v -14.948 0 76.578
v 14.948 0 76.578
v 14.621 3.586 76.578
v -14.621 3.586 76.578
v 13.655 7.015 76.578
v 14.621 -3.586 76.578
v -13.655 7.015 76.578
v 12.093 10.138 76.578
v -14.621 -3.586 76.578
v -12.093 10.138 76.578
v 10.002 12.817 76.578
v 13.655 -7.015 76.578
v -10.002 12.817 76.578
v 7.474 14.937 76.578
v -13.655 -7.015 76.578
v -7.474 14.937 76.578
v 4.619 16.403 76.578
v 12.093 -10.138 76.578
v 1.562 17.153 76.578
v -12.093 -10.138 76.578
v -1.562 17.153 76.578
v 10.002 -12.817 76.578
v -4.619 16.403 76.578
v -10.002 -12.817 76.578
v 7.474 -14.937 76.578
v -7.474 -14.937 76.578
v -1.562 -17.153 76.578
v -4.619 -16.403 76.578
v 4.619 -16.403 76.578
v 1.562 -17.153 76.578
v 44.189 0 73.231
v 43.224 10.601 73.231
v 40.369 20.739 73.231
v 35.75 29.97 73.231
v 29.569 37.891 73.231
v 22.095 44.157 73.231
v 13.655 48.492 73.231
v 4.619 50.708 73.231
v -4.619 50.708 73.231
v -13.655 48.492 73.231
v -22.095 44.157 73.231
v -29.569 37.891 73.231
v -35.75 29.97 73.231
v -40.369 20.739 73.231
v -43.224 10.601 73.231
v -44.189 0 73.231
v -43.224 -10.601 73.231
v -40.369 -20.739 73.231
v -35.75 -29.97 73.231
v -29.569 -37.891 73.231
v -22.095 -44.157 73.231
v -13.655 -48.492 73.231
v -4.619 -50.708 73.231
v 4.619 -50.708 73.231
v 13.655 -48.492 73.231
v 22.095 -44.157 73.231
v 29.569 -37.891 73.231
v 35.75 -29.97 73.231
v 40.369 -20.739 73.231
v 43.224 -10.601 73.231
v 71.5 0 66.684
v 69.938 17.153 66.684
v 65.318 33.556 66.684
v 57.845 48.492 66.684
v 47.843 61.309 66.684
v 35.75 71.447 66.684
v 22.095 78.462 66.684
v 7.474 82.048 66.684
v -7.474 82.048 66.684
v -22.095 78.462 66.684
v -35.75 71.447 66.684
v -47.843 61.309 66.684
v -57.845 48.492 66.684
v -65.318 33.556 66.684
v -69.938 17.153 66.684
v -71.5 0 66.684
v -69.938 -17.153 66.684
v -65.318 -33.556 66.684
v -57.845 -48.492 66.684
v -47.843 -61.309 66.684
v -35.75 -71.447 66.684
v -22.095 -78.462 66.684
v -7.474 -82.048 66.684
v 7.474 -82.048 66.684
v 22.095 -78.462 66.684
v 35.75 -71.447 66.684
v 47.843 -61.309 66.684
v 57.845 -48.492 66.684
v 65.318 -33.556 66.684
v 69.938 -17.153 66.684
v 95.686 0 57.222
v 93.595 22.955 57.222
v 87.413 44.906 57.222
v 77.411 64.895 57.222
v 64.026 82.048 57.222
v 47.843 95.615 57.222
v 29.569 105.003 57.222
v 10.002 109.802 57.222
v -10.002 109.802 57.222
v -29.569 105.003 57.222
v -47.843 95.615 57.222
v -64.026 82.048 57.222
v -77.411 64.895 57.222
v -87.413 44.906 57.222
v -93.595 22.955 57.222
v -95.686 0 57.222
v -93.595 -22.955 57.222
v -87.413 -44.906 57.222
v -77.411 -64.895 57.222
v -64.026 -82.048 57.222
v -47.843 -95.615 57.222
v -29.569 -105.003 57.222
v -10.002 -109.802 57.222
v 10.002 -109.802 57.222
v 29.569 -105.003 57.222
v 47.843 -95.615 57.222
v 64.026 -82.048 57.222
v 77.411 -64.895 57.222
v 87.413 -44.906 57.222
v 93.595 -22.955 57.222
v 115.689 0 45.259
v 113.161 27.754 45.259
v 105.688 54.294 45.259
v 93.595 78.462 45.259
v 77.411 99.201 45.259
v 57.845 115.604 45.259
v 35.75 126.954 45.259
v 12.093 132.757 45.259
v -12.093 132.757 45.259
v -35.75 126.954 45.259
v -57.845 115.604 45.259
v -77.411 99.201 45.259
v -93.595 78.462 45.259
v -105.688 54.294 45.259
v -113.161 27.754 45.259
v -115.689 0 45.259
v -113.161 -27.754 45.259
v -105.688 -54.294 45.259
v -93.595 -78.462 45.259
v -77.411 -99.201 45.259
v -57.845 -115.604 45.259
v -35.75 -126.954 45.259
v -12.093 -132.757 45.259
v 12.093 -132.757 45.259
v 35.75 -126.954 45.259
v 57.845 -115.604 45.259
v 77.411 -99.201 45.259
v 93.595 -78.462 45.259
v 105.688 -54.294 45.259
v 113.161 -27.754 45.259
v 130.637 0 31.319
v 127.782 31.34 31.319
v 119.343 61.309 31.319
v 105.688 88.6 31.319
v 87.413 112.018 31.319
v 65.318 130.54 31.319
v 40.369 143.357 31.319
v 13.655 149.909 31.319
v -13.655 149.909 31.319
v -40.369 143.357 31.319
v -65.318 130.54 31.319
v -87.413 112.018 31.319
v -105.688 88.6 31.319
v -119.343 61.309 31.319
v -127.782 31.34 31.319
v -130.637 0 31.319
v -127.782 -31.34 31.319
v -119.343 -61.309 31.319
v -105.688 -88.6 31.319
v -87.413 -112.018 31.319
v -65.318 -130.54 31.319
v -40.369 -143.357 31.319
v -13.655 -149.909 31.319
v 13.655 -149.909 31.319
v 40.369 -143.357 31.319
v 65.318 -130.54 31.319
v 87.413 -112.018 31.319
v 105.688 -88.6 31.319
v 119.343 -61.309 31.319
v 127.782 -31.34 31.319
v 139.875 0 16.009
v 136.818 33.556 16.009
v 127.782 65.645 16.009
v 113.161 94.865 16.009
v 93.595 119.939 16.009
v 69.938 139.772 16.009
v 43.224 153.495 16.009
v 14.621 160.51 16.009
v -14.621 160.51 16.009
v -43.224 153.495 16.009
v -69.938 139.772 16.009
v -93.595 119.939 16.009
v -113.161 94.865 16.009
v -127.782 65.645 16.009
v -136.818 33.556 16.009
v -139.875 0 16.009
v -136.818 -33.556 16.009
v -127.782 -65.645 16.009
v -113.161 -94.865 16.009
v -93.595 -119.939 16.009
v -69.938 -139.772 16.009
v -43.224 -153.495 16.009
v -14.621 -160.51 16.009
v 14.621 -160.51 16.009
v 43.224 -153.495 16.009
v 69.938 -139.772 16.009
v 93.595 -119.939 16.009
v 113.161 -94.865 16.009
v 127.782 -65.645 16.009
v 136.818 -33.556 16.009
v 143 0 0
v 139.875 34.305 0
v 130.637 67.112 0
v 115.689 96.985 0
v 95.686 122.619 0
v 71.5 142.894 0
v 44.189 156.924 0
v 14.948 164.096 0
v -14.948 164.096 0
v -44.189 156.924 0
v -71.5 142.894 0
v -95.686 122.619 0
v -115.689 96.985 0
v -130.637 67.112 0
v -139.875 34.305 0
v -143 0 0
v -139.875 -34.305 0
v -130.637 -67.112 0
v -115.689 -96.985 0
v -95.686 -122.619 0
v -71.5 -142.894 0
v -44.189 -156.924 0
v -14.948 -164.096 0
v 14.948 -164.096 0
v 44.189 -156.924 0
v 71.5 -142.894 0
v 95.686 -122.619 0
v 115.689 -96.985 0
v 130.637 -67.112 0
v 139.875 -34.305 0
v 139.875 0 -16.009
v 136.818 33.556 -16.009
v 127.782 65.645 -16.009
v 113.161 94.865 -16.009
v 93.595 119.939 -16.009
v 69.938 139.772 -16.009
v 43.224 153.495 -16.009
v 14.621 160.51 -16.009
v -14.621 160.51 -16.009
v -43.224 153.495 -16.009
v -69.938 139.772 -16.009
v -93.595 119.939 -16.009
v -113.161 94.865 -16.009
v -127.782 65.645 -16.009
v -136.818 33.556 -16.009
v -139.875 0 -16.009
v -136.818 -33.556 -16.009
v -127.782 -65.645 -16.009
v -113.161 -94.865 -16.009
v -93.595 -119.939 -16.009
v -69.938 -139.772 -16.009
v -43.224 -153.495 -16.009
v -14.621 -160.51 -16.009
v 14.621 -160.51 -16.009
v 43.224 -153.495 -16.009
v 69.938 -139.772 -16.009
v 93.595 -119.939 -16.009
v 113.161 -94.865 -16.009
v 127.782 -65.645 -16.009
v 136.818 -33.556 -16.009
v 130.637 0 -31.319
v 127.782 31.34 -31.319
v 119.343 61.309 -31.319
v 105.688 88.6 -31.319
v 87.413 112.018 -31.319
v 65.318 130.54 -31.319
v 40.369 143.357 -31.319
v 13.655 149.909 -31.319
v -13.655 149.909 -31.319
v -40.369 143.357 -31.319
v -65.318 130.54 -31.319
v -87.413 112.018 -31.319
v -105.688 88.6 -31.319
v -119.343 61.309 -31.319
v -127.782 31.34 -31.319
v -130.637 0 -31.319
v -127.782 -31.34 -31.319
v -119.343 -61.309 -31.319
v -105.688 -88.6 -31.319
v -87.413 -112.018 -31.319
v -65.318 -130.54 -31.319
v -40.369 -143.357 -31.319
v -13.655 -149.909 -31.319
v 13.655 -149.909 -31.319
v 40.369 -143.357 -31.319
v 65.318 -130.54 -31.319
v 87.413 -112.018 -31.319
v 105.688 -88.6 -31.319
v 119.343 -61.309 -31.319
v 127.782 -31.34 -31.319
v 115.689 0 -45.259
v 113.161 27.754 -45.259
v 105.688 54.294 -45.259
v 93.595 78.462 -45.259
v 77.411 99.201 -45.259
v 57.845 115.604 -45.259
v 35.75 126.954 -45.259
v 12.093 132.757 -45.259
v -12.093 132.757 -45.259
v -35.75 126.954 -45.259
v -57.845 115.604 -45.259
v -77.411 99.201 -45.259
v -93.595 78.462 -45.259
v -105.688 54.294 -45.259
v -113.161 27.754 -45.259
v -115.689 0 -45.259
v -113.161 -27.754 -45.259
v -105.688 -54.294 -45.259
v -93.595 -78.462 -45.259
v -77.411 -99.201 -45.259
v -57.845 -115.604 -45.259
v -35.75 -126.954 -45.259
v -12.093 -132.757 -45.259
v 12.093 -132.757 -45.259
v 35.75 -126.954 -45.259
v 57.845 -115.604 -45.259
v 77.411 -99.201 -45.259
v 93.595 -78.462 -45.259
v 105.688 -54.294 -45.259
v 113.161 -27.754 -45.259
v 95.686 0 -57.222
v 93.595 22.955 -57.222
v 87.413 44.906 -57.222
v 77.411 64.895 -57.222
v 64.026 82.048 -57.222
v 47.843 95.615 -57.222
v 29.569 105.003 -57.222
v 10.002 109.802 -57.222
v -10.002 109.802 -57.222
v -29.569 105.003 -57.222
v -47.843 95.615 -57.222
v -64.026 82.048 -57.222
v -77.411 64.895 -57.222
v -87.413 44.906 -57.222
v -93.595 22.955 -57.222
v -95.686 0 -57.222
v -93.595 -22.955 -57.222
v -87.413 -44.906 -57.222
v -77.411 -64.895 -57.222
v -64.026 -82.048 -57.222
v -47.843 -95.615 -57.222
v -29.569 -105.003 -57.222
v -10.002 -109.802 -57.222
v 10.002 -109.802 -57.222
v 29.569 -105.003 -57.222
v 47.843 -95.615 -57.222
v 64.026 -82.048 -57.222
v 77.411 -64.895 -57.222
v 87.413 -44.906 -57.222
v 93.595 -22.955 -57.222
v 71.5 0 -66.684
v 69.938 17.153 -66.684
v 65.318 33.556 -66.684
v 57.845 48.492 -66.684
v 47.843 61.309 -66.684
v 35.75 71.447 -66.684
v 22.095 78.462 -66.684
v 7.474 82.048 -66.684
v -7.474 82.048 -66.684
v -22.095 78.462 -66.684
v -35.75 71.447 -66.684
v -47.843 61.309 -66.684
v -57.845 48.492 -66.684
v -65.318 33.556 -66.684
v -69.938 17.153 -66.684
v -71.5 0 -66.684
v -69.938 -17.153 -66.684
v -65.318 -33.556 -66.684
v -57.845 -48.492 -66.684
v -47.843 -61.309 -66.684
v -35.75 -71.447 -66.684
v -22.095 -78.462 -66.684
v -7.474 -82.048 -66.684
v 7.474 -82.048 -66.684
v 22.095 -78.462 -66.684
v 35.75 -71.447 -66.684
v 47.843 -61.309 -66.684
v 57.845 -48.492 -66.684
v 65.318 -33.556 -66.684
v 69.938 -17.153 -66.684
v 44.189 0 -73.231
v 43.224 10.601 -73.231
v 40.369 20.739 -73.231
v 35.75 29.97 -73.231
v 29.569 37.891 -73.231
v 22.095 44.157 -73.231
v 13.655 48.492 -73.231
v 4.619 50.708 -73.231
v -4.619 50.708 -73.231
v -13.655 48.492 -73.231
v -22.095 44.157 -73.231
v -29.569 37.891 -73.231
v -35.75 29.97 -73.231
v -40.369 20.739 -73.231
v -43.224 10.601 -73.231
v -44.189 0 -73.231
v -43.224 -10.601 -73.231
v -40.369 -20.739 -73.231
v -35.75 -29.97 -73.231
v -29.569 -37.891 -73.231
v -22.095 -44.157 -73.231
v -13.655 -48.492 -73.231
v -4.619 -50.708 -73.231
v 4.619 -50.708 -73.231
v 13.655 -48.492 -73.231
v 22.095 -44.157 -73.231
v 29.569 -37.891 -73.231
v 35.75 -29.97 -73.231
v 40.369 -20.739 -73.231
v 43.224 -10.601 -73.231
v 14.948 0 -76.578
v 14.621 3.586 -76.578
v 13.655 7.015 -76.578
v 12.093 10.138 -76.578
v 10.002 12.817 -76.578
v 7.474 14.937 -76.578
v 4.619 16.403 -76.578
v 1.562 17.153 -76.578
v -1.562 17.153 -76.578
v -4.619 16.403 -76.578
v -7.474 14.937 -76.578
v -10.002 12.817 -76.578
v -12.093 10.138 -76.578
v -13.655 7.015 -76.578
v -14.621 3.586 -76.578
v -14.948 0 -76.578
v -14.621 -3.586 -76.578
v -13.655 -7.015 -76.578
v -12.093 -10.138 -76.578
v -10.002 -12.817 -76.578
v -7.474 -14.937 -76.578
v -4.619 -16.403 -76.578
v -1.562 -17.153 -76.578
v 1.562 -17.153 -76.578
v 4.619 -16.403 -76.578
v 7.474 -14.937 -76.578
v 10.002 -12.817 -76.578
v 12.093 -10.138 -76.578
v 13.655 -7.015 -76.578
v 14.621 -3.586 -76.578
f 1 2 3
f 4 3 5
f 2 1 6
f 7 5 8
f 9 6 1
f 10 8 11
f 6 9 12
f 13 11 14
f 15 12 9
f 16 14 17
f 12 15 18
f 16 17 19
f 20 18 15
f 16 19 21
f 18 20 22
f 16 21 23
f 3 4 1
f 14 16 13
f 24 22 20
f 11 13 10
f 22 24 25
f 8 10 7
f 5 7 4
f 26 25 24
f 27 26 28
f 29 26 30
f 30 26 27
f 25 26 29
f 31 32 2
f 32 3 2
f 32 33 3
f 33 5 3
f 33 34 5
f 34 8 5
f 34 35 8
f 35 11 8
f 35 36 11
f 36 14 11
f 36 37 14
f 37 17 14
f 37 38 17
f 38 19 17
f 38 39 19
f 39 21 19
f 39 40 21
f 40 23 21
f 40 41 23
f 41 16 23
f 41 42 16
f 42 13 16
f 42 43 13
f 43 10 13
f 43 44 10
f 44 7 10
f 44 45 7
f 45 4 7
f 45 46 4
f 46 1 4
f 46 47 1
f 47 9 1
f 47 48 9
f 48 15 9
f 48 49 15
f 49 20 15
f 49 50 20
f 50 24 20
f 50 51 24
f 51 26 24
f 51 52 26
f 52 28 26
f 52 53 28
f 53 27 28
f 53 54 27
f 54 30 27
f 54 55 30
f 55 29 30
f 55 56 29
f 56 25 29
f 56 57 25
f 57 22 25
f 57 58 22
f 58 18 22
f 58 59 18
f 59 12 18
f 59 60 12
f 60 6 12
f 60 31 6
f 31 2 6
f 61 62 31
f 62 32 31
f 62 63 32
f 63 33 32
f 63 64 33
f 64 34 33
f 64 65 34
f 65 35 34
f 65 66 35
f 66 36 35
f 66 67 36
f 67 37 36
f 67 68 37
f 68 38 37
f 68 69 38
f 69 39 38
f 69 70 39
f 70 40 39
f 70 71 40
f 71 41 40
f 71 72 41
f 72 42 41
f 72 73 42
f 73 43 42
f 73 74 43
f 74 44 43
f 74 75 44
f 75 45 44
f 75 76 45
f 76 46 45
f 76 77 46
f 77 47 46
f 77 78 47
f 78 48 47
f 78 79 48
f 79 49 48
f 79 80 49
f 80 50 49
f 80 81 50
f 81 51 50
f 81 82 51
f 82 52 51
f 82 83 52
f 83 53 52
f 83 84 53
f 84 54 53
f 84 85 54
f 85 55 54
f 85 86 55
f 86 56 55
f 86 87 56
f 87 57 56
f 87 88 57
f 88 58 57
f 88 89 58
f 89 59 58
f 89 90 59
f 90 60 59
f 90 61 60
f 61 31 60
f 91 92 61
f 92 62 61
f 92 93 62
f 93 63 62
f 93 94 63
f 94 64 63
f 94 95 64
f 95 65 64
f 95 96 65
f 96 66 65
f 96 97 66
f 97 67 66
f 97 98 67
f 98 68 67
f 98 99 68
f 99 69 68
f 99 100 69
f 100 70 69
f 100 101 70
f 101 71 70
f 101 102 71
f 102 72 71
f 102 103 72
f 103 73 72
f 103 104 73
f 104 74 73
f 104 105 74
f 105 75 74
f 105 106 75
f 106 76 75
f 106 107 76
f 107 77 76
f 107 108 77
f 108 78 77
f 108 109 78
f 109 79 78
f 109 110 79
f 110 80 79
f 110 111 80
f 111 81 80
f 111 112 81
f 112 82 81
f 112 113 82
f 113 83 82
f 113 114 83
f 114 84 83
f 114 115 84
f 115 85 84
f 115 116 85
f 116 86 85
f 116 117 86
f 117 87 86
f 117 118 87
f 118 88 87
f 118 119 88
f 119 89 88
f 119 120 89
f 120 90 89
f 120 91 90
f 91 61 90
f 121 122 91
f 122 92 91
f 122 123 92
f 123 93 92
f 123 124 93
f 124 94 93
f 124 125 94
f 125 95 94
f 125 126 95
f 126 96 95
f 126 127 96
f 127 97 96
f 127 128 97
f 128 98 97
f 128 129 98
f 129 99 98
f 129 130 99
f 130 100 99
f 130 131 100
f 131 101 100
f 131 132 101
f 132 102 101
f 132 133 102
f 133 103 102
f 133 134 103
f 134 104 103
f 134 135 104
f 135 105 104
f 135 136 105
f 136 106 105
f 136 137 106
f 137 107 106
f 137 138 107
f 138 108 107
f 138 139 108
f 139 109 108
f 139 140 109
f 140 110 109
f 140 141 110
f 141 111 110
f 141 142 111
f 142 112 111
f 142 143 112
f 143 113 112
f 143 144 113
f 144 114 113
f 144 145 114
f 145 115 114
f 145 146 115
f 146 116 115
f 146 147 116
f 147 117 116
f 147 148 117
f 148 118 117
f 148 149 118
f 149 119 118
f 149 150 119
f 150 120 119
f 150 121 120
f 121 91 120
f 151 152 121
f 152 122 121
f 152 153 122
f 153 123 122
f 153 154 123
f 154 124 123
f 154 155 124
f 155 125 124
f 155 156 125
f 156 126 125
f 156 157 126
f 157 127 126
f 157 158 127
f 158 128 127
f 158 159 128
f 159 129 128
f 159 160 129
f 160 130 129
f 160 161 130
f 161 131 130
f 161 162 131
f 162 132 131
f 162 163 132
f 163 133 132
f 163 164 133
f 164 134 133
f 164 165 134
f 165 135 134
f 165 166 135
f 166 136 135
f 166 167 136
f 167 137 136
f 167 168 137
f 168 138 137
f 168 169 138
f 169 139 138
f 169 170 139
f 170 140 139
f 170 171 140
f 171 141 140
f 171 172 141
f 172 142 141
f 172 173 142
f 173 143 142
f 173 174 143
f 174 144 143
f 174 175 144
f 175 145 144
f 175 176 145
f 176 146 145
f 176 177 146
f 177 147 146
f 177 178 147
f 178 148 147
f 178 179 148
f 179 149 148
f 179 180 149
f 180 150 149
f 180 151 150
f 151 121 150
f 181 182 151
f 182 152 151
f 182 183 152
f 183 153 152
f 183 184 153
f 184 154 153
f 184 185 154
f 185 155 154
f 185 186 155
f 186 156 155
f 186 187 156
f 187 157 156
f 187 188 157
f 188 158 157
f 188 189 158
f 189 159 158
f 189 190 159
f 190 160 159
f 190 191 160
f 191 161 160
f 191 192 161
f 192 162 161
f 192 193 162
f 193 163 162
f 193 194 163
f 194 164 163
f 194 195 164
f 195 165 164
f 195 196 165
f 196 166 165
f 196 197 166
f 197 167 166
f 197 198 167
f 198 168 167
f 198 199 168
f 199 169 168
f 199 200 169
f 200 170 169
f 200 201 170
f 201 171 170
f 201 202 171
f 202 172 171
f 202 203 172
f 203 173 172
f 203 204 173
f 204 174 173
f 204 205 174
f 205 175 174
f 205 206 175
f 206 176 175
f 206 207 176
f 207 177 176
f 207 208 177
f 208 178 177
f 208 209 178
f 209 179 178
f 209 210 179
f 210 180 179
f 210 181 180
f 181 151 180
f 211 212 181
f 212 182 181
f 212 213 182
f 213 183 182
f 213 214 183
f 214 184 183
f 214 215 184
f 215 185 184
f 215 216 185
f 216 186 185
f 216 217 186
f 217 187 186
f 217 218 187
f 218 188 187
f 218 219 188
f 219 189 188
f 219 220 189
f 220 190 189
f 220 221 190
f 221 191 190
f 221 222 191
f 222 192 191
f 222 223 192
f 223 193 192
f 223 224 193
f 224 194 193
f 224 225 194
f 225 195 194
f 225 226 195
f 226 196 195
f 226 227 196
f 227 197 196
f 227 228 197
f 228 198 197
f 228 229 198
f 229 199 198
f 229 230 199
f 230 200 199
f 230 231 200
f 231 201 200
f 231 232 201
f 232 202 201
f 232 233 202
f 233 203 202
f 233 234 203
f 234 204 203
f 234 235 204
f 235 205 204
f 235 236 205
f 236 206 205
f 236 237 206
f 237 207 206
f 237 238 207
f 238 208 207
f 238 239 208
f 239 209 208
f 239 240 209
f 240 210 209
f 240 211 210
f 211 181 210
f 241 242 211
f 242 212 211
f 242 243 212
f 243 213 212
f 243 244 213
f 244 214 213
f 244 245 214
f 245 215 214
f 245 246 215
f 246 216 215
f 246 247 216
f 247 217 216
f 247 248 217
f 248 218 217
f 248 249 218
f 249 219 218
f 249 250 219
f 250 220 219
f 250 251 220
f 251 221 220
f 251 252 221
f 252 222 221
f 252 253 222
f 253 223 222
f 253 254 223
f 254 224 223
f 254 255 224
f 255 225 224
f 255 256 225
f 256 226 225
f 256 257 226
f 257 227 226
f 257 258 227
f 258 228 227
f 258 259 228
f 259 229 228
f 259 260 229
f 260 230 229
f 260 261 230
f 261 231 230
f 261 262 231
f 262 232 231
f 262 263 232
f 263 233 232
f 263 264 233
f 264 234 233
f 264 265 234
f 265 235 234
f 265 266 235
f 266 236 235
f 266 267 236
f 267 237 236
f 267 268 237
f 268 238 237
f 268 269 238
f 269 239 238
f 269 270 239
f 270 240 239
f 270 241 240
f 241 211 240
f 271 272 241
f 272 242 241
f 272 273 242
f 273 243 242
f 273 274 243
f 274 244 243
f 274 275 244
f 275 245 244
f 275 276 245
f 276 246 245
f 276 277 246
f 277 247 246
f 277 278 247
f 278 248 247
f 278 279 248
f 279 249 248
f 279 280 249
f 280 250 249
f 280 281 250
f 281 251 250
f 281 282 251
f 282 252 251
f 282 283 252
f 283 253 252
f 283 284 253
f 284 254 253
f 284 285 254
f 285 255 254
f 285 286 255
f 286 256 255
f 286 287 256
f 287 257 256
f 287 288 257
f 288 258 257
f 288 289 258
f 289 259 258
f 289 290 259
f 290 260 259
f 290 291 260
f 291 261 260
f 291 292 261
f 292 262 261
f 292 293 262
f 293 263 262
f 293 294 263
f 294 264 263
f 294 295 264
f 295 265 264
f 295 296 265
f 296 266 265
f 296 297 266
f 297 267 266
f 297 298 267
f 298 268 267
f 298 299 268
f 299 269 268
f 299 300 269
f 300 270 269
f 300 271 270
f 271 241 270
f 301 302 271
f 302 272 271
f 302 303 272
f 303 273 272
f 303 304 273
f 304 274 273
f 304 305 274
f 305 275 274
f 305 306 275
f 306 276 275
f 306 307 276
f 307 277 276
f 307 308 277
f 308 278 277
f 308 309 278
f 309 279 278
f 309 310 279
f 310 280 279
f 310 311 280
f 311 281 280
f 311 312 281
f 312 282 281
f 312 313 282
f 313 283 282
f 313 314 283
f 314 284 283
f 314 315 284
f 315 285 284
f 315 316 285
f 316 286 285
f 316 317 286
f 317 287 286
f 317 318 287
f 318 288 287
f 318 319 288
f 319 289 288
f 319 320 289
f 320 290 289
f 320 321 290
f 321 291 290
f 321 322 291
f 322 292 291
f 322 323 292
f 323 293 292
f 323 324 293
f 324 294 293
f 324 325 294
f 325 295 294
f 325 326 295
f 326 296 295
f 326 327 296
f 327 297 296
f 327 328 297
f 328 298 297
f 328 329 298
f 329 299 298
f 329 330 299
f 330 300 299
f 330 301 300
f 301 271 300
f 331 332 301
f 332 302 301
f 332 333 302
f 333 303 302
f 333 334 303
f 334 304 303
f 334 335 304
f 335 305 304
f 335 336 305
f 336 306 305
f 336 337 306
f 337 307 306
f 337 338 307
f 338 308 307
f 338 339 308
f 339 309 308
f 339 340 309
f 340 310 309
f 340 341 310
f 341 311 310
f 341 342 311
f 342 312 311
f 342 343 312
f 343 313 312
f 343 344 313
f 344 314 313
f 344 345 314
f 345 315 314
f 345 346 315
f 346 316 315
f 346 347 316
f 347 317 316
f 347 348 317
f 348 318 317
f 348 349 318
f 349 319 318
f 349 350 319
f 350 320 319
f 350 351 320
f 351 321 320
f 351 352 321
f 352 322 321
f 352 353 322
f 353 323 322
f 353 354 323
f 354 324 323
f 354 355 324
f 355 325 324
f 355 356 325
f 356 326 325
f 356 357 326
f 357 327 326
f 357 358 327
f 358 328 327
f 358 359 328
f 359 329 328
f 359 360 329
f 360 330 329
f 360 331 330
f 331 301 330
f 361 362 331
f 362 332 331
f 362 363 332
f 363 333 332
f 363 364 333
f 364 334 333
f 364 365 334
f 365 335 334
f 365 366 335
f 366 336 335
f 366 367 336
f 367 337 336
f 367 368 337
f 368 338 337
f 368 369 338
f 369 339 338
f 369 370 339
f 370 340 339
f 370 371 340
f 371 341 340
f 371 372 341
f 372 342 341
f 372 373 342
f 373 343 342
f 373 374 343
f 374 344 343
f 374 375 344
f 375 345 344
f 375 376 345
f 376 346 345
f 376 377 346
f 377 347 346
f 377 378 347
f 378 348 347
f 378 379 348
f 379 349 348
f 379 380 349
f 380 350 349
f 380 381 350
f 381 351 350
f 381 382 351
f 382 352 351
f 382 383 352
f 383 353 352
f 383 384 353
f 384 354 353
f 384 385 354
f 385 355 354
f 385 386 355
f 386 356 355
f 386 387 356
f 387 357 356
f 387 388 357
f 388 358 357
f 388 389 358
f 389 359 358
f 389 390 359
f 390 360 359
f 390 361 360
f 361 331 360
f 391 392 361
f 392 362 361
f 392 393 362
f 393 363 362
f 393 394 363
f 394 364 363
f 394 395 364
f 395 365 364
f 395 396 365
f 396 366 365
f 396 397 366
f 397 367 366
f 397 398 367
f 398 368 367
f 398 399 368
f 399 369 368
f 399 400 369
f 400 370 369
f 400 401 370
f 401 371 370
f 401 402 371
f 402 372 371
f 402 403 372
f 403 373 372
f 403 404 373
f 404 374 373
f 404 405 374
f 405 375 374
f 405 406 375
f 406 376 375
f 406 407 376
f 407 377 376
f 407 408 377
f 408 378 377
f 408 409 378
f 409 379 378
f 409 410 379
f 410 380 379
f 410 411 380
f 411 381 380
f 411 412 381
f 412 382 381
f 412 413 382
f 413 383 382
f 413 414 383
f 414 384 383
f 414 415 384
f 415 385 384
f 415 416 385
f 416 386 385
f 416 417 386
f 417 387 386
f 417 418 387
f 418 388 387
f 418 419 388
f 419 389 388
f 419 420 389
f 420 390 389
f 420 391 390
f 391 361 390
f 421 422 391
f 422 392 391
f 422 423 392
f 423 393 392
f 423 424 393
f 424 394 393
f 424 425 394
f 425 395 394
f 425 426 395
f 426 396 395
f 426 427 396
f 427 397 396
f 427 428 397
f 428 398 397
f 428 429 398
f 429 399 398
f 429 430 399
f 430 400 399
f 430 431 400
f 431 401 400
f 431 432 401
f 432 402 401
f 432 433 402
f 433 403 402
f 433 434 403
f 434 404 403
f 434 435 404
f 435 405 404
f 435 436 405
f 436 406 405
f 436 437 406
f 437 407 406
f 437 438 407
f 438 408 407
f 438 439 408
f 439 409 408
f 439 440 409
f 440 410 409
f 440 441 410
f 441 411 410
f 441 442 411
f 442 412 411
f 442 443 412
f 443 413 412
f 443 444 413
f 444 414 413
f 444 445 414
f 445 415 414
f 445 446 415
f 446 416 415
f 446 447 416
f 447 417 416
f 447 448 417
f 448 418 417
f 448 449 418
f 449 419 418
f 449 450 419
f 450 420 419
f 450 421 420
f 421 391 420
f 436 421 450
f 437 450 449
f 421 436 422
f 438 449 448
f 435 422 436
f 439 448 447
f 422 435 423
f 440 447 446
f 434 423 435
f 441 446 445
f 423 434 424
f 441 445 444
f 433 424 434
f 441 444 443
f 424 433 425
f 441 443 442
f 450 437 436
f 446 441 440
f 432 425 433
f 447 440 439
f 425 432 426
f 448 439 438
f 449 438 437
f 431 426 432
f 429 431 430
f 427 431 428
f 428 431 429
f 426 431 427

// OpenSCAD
// Generated by SolidPython 1.0.1 on 2020-07-29 00:46:51


scale(v = [13, 15, 7]) {
	sphere(r = 11);
}
/***********************************************
*********      SolidPython code:      **********
************************************************
 
# import packages: SolidPython
from solid import *
from solid.utils import *
from itertools import chain, combinations, permutations


class Resize:

    def __init__(self, scad_file):
        self.scad_file = scad_file
        #self.scad_file = import_scad(scad_file)
        # cone/cylinder param:
        self.r1 = 0
        self.r2 = 0
        self.h = 0
        # rectangular prism param:
        self.w = 0
        self.l = 0
        # ellipse param:
        self.r = 0

    # import OpenScad code (file name corresponds to shape)


    # classify shape + parameters
    def assign(self, param1, param2, param3):
        if self.scad_file == 'cone.scad':
            self.r1 = param1
            self.r2 = param2
            self.h = param3
        elif self.scad_file == 'cylinder.scad':
            self.r1 = param1
            self.r2 = param2
            self.h = param3
        elif self.scad_file == 'rectangularPrism.scad':
            self.h = param1
            self.l = param2
            self.w = param3
        else:
            self.r = param1
            self.h = param2

    # resize parameters
    def iterate(self):
        x = range(3, 20, 2)
        i = 1
        if self.scad_file == 'cone.scad':
            tempList = list(permutations(x, 2))
            for temp in tempList:
                param1 = temp[0]
                param2 = temp[1]
                filepath = 'produced_scad_files/' + 'cone' + str(param1) + '_' + str(param2) + '_' + '.scad'
                scad_render_to_file(cylinder(h=param1, r1=param2, r2=0), filepath)

        elif self.scad_file == 'cylinder.scad':
            tempList = list(permutations(x, 3))
            for temp in tempList:
                param1 = temp[0]
                param2 = temp[1]
                filepath = 'produced_scad_files/' + 'cylinder' + str(param1) + '_' + str(param2) + '_' + '.scad'
                scad_render_to_file(cylinder(h=param1, r1=param2, r2=param2), filepath)

        elif self.scad_file == 'rectangularPrism.scad':
            tempList = list(permutations(x, 3))
            for temp in tempList:
                param1 = temp[0]
                param2 = temp[1]
                param3 = temp[2]
                filepath = 'produced_scad_files/' + 'rectangularPrism' + str(param1) + '_' + str(param2) + '_' + str(
                    param3) + '.scad'
                scad_render_to_file(cube(size=(param1, param2, param3)), filepath)

        elif self.scad_file == 'ellipse.scad':
            tempList = list(permutations(x, 4))
            for temp in tempList:
                param1 = temp[0]
                param2 = temp[1]
                param3 = temp[2]
                param4 = temp[3]
                filepath = 'produced_scad_files/' + 'ellipse' + str(param1) + '_' + str(param2) + '_' + str(param3) + '_' + str(param4) + '.scad'
                scad_render_to_file(scale([param1, param2, param3])(sphere(r=param4)), filepath)

    def render_to_scadfile(self):
        scad_render_to_file(scad, 'example.scad') 
 
************************************************/
